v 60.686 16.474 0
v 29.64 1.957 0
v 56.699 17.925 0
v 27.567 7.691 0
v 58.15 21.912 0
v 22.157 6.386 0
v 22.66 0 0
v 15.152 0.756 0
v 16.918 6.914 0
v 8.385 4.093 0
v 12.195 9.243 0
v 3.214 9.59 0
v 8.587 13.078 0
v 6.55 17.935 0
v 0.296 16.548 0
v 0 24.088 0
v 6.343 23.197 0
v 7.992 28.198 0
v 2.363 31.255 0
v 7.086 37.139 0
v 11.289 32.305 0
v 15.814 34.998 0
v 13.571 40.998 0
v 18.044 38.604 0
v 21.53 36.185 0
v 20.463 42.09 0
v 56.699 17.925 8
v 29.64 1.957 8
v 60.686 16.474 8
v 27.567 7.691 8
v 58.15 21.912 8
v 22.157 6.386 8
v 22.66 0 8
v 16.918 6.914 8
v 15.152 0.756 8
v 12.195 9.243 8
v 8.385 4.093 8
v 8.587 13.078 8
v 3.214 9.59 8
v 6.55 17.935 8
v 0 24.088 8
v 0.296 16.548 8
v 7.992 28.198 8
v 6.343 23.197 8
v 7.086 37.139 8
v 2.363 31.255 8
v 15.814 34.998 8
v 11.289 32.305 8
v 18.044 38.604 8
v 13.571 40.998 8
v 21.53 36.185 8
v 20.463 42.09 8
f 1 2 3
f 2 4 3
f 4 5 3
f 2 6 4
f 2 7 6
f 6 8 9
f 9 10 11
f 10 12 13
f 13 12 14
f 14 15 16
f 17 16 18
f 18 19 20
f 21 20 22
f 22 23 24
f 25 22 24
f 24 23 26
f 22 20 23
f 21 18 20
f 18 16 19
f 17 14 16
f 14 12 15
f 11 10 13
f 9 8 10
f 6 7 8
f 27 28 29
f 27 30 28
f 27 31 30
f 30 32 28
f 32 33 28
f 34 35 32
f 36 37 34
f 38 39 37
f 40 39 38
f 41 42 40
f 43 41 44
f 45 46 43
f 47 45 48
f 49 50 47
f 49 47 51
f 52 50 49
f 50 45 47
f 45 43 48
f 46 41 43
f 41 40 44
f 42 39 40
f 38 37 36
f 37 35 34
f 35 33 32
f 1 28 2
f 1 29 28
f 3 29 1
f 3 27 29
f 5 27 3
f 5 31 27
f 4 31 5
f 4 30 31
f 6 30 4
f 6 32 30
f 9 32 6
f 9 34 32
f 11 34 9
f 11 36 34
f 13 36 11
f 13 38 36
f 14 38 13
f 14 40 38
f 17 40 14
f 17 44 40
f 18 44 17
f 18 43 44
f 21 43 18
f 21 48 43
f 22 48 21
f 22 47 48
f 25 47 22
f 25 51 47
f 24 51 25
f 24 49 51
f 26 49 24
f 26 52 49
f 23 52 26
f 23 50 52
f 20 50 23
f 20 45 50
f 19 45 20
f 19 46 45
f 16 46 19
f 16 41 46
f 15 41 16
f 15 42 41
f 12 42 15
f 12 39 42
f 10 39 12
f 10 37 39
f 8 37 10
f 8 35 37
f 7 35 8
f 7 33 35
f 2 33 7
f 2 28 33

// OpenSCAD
$fn = 32;

// ----------------------------------------------------------------------
// Hook plate: curl radius 18 mm over 205 degrees, 6 mm thick band
// ----------------------------------------------------------------------

// --- parameters (mm) ---
profile_height = 8;       // extrusion height
profile_points = 26;      // points of the closed outline

profile = [[18.044, 38.604], [20.463, 42.09], [13.571, 40.998], [7.086, 37.139], [2.363, 31.255], [0, 24.088], [0.296, 16.548], [3.214, 9.59], [8.385, 4.093], [15.152, 0.756], [22.66, 0], [29.64, 1.957], [60.686, 16.474], [56.699, 17.925], [58.15, 21.912], [27.567, 7.691], [22.157, 6.386], [16.918, 6.914], [12.195, 9.243], [8.587, 13.078], [6.55, 17.935], [6.343, 23.197], [7.992, 28.198], [11.289, 32.305], [15.814, 34.998], [21.53, 36.185]];  // single closed polygon, 26 points, counter clockwise

// --- the one profile operation ---
linear_extrude(height = profile_height) polygon(points = profile);
